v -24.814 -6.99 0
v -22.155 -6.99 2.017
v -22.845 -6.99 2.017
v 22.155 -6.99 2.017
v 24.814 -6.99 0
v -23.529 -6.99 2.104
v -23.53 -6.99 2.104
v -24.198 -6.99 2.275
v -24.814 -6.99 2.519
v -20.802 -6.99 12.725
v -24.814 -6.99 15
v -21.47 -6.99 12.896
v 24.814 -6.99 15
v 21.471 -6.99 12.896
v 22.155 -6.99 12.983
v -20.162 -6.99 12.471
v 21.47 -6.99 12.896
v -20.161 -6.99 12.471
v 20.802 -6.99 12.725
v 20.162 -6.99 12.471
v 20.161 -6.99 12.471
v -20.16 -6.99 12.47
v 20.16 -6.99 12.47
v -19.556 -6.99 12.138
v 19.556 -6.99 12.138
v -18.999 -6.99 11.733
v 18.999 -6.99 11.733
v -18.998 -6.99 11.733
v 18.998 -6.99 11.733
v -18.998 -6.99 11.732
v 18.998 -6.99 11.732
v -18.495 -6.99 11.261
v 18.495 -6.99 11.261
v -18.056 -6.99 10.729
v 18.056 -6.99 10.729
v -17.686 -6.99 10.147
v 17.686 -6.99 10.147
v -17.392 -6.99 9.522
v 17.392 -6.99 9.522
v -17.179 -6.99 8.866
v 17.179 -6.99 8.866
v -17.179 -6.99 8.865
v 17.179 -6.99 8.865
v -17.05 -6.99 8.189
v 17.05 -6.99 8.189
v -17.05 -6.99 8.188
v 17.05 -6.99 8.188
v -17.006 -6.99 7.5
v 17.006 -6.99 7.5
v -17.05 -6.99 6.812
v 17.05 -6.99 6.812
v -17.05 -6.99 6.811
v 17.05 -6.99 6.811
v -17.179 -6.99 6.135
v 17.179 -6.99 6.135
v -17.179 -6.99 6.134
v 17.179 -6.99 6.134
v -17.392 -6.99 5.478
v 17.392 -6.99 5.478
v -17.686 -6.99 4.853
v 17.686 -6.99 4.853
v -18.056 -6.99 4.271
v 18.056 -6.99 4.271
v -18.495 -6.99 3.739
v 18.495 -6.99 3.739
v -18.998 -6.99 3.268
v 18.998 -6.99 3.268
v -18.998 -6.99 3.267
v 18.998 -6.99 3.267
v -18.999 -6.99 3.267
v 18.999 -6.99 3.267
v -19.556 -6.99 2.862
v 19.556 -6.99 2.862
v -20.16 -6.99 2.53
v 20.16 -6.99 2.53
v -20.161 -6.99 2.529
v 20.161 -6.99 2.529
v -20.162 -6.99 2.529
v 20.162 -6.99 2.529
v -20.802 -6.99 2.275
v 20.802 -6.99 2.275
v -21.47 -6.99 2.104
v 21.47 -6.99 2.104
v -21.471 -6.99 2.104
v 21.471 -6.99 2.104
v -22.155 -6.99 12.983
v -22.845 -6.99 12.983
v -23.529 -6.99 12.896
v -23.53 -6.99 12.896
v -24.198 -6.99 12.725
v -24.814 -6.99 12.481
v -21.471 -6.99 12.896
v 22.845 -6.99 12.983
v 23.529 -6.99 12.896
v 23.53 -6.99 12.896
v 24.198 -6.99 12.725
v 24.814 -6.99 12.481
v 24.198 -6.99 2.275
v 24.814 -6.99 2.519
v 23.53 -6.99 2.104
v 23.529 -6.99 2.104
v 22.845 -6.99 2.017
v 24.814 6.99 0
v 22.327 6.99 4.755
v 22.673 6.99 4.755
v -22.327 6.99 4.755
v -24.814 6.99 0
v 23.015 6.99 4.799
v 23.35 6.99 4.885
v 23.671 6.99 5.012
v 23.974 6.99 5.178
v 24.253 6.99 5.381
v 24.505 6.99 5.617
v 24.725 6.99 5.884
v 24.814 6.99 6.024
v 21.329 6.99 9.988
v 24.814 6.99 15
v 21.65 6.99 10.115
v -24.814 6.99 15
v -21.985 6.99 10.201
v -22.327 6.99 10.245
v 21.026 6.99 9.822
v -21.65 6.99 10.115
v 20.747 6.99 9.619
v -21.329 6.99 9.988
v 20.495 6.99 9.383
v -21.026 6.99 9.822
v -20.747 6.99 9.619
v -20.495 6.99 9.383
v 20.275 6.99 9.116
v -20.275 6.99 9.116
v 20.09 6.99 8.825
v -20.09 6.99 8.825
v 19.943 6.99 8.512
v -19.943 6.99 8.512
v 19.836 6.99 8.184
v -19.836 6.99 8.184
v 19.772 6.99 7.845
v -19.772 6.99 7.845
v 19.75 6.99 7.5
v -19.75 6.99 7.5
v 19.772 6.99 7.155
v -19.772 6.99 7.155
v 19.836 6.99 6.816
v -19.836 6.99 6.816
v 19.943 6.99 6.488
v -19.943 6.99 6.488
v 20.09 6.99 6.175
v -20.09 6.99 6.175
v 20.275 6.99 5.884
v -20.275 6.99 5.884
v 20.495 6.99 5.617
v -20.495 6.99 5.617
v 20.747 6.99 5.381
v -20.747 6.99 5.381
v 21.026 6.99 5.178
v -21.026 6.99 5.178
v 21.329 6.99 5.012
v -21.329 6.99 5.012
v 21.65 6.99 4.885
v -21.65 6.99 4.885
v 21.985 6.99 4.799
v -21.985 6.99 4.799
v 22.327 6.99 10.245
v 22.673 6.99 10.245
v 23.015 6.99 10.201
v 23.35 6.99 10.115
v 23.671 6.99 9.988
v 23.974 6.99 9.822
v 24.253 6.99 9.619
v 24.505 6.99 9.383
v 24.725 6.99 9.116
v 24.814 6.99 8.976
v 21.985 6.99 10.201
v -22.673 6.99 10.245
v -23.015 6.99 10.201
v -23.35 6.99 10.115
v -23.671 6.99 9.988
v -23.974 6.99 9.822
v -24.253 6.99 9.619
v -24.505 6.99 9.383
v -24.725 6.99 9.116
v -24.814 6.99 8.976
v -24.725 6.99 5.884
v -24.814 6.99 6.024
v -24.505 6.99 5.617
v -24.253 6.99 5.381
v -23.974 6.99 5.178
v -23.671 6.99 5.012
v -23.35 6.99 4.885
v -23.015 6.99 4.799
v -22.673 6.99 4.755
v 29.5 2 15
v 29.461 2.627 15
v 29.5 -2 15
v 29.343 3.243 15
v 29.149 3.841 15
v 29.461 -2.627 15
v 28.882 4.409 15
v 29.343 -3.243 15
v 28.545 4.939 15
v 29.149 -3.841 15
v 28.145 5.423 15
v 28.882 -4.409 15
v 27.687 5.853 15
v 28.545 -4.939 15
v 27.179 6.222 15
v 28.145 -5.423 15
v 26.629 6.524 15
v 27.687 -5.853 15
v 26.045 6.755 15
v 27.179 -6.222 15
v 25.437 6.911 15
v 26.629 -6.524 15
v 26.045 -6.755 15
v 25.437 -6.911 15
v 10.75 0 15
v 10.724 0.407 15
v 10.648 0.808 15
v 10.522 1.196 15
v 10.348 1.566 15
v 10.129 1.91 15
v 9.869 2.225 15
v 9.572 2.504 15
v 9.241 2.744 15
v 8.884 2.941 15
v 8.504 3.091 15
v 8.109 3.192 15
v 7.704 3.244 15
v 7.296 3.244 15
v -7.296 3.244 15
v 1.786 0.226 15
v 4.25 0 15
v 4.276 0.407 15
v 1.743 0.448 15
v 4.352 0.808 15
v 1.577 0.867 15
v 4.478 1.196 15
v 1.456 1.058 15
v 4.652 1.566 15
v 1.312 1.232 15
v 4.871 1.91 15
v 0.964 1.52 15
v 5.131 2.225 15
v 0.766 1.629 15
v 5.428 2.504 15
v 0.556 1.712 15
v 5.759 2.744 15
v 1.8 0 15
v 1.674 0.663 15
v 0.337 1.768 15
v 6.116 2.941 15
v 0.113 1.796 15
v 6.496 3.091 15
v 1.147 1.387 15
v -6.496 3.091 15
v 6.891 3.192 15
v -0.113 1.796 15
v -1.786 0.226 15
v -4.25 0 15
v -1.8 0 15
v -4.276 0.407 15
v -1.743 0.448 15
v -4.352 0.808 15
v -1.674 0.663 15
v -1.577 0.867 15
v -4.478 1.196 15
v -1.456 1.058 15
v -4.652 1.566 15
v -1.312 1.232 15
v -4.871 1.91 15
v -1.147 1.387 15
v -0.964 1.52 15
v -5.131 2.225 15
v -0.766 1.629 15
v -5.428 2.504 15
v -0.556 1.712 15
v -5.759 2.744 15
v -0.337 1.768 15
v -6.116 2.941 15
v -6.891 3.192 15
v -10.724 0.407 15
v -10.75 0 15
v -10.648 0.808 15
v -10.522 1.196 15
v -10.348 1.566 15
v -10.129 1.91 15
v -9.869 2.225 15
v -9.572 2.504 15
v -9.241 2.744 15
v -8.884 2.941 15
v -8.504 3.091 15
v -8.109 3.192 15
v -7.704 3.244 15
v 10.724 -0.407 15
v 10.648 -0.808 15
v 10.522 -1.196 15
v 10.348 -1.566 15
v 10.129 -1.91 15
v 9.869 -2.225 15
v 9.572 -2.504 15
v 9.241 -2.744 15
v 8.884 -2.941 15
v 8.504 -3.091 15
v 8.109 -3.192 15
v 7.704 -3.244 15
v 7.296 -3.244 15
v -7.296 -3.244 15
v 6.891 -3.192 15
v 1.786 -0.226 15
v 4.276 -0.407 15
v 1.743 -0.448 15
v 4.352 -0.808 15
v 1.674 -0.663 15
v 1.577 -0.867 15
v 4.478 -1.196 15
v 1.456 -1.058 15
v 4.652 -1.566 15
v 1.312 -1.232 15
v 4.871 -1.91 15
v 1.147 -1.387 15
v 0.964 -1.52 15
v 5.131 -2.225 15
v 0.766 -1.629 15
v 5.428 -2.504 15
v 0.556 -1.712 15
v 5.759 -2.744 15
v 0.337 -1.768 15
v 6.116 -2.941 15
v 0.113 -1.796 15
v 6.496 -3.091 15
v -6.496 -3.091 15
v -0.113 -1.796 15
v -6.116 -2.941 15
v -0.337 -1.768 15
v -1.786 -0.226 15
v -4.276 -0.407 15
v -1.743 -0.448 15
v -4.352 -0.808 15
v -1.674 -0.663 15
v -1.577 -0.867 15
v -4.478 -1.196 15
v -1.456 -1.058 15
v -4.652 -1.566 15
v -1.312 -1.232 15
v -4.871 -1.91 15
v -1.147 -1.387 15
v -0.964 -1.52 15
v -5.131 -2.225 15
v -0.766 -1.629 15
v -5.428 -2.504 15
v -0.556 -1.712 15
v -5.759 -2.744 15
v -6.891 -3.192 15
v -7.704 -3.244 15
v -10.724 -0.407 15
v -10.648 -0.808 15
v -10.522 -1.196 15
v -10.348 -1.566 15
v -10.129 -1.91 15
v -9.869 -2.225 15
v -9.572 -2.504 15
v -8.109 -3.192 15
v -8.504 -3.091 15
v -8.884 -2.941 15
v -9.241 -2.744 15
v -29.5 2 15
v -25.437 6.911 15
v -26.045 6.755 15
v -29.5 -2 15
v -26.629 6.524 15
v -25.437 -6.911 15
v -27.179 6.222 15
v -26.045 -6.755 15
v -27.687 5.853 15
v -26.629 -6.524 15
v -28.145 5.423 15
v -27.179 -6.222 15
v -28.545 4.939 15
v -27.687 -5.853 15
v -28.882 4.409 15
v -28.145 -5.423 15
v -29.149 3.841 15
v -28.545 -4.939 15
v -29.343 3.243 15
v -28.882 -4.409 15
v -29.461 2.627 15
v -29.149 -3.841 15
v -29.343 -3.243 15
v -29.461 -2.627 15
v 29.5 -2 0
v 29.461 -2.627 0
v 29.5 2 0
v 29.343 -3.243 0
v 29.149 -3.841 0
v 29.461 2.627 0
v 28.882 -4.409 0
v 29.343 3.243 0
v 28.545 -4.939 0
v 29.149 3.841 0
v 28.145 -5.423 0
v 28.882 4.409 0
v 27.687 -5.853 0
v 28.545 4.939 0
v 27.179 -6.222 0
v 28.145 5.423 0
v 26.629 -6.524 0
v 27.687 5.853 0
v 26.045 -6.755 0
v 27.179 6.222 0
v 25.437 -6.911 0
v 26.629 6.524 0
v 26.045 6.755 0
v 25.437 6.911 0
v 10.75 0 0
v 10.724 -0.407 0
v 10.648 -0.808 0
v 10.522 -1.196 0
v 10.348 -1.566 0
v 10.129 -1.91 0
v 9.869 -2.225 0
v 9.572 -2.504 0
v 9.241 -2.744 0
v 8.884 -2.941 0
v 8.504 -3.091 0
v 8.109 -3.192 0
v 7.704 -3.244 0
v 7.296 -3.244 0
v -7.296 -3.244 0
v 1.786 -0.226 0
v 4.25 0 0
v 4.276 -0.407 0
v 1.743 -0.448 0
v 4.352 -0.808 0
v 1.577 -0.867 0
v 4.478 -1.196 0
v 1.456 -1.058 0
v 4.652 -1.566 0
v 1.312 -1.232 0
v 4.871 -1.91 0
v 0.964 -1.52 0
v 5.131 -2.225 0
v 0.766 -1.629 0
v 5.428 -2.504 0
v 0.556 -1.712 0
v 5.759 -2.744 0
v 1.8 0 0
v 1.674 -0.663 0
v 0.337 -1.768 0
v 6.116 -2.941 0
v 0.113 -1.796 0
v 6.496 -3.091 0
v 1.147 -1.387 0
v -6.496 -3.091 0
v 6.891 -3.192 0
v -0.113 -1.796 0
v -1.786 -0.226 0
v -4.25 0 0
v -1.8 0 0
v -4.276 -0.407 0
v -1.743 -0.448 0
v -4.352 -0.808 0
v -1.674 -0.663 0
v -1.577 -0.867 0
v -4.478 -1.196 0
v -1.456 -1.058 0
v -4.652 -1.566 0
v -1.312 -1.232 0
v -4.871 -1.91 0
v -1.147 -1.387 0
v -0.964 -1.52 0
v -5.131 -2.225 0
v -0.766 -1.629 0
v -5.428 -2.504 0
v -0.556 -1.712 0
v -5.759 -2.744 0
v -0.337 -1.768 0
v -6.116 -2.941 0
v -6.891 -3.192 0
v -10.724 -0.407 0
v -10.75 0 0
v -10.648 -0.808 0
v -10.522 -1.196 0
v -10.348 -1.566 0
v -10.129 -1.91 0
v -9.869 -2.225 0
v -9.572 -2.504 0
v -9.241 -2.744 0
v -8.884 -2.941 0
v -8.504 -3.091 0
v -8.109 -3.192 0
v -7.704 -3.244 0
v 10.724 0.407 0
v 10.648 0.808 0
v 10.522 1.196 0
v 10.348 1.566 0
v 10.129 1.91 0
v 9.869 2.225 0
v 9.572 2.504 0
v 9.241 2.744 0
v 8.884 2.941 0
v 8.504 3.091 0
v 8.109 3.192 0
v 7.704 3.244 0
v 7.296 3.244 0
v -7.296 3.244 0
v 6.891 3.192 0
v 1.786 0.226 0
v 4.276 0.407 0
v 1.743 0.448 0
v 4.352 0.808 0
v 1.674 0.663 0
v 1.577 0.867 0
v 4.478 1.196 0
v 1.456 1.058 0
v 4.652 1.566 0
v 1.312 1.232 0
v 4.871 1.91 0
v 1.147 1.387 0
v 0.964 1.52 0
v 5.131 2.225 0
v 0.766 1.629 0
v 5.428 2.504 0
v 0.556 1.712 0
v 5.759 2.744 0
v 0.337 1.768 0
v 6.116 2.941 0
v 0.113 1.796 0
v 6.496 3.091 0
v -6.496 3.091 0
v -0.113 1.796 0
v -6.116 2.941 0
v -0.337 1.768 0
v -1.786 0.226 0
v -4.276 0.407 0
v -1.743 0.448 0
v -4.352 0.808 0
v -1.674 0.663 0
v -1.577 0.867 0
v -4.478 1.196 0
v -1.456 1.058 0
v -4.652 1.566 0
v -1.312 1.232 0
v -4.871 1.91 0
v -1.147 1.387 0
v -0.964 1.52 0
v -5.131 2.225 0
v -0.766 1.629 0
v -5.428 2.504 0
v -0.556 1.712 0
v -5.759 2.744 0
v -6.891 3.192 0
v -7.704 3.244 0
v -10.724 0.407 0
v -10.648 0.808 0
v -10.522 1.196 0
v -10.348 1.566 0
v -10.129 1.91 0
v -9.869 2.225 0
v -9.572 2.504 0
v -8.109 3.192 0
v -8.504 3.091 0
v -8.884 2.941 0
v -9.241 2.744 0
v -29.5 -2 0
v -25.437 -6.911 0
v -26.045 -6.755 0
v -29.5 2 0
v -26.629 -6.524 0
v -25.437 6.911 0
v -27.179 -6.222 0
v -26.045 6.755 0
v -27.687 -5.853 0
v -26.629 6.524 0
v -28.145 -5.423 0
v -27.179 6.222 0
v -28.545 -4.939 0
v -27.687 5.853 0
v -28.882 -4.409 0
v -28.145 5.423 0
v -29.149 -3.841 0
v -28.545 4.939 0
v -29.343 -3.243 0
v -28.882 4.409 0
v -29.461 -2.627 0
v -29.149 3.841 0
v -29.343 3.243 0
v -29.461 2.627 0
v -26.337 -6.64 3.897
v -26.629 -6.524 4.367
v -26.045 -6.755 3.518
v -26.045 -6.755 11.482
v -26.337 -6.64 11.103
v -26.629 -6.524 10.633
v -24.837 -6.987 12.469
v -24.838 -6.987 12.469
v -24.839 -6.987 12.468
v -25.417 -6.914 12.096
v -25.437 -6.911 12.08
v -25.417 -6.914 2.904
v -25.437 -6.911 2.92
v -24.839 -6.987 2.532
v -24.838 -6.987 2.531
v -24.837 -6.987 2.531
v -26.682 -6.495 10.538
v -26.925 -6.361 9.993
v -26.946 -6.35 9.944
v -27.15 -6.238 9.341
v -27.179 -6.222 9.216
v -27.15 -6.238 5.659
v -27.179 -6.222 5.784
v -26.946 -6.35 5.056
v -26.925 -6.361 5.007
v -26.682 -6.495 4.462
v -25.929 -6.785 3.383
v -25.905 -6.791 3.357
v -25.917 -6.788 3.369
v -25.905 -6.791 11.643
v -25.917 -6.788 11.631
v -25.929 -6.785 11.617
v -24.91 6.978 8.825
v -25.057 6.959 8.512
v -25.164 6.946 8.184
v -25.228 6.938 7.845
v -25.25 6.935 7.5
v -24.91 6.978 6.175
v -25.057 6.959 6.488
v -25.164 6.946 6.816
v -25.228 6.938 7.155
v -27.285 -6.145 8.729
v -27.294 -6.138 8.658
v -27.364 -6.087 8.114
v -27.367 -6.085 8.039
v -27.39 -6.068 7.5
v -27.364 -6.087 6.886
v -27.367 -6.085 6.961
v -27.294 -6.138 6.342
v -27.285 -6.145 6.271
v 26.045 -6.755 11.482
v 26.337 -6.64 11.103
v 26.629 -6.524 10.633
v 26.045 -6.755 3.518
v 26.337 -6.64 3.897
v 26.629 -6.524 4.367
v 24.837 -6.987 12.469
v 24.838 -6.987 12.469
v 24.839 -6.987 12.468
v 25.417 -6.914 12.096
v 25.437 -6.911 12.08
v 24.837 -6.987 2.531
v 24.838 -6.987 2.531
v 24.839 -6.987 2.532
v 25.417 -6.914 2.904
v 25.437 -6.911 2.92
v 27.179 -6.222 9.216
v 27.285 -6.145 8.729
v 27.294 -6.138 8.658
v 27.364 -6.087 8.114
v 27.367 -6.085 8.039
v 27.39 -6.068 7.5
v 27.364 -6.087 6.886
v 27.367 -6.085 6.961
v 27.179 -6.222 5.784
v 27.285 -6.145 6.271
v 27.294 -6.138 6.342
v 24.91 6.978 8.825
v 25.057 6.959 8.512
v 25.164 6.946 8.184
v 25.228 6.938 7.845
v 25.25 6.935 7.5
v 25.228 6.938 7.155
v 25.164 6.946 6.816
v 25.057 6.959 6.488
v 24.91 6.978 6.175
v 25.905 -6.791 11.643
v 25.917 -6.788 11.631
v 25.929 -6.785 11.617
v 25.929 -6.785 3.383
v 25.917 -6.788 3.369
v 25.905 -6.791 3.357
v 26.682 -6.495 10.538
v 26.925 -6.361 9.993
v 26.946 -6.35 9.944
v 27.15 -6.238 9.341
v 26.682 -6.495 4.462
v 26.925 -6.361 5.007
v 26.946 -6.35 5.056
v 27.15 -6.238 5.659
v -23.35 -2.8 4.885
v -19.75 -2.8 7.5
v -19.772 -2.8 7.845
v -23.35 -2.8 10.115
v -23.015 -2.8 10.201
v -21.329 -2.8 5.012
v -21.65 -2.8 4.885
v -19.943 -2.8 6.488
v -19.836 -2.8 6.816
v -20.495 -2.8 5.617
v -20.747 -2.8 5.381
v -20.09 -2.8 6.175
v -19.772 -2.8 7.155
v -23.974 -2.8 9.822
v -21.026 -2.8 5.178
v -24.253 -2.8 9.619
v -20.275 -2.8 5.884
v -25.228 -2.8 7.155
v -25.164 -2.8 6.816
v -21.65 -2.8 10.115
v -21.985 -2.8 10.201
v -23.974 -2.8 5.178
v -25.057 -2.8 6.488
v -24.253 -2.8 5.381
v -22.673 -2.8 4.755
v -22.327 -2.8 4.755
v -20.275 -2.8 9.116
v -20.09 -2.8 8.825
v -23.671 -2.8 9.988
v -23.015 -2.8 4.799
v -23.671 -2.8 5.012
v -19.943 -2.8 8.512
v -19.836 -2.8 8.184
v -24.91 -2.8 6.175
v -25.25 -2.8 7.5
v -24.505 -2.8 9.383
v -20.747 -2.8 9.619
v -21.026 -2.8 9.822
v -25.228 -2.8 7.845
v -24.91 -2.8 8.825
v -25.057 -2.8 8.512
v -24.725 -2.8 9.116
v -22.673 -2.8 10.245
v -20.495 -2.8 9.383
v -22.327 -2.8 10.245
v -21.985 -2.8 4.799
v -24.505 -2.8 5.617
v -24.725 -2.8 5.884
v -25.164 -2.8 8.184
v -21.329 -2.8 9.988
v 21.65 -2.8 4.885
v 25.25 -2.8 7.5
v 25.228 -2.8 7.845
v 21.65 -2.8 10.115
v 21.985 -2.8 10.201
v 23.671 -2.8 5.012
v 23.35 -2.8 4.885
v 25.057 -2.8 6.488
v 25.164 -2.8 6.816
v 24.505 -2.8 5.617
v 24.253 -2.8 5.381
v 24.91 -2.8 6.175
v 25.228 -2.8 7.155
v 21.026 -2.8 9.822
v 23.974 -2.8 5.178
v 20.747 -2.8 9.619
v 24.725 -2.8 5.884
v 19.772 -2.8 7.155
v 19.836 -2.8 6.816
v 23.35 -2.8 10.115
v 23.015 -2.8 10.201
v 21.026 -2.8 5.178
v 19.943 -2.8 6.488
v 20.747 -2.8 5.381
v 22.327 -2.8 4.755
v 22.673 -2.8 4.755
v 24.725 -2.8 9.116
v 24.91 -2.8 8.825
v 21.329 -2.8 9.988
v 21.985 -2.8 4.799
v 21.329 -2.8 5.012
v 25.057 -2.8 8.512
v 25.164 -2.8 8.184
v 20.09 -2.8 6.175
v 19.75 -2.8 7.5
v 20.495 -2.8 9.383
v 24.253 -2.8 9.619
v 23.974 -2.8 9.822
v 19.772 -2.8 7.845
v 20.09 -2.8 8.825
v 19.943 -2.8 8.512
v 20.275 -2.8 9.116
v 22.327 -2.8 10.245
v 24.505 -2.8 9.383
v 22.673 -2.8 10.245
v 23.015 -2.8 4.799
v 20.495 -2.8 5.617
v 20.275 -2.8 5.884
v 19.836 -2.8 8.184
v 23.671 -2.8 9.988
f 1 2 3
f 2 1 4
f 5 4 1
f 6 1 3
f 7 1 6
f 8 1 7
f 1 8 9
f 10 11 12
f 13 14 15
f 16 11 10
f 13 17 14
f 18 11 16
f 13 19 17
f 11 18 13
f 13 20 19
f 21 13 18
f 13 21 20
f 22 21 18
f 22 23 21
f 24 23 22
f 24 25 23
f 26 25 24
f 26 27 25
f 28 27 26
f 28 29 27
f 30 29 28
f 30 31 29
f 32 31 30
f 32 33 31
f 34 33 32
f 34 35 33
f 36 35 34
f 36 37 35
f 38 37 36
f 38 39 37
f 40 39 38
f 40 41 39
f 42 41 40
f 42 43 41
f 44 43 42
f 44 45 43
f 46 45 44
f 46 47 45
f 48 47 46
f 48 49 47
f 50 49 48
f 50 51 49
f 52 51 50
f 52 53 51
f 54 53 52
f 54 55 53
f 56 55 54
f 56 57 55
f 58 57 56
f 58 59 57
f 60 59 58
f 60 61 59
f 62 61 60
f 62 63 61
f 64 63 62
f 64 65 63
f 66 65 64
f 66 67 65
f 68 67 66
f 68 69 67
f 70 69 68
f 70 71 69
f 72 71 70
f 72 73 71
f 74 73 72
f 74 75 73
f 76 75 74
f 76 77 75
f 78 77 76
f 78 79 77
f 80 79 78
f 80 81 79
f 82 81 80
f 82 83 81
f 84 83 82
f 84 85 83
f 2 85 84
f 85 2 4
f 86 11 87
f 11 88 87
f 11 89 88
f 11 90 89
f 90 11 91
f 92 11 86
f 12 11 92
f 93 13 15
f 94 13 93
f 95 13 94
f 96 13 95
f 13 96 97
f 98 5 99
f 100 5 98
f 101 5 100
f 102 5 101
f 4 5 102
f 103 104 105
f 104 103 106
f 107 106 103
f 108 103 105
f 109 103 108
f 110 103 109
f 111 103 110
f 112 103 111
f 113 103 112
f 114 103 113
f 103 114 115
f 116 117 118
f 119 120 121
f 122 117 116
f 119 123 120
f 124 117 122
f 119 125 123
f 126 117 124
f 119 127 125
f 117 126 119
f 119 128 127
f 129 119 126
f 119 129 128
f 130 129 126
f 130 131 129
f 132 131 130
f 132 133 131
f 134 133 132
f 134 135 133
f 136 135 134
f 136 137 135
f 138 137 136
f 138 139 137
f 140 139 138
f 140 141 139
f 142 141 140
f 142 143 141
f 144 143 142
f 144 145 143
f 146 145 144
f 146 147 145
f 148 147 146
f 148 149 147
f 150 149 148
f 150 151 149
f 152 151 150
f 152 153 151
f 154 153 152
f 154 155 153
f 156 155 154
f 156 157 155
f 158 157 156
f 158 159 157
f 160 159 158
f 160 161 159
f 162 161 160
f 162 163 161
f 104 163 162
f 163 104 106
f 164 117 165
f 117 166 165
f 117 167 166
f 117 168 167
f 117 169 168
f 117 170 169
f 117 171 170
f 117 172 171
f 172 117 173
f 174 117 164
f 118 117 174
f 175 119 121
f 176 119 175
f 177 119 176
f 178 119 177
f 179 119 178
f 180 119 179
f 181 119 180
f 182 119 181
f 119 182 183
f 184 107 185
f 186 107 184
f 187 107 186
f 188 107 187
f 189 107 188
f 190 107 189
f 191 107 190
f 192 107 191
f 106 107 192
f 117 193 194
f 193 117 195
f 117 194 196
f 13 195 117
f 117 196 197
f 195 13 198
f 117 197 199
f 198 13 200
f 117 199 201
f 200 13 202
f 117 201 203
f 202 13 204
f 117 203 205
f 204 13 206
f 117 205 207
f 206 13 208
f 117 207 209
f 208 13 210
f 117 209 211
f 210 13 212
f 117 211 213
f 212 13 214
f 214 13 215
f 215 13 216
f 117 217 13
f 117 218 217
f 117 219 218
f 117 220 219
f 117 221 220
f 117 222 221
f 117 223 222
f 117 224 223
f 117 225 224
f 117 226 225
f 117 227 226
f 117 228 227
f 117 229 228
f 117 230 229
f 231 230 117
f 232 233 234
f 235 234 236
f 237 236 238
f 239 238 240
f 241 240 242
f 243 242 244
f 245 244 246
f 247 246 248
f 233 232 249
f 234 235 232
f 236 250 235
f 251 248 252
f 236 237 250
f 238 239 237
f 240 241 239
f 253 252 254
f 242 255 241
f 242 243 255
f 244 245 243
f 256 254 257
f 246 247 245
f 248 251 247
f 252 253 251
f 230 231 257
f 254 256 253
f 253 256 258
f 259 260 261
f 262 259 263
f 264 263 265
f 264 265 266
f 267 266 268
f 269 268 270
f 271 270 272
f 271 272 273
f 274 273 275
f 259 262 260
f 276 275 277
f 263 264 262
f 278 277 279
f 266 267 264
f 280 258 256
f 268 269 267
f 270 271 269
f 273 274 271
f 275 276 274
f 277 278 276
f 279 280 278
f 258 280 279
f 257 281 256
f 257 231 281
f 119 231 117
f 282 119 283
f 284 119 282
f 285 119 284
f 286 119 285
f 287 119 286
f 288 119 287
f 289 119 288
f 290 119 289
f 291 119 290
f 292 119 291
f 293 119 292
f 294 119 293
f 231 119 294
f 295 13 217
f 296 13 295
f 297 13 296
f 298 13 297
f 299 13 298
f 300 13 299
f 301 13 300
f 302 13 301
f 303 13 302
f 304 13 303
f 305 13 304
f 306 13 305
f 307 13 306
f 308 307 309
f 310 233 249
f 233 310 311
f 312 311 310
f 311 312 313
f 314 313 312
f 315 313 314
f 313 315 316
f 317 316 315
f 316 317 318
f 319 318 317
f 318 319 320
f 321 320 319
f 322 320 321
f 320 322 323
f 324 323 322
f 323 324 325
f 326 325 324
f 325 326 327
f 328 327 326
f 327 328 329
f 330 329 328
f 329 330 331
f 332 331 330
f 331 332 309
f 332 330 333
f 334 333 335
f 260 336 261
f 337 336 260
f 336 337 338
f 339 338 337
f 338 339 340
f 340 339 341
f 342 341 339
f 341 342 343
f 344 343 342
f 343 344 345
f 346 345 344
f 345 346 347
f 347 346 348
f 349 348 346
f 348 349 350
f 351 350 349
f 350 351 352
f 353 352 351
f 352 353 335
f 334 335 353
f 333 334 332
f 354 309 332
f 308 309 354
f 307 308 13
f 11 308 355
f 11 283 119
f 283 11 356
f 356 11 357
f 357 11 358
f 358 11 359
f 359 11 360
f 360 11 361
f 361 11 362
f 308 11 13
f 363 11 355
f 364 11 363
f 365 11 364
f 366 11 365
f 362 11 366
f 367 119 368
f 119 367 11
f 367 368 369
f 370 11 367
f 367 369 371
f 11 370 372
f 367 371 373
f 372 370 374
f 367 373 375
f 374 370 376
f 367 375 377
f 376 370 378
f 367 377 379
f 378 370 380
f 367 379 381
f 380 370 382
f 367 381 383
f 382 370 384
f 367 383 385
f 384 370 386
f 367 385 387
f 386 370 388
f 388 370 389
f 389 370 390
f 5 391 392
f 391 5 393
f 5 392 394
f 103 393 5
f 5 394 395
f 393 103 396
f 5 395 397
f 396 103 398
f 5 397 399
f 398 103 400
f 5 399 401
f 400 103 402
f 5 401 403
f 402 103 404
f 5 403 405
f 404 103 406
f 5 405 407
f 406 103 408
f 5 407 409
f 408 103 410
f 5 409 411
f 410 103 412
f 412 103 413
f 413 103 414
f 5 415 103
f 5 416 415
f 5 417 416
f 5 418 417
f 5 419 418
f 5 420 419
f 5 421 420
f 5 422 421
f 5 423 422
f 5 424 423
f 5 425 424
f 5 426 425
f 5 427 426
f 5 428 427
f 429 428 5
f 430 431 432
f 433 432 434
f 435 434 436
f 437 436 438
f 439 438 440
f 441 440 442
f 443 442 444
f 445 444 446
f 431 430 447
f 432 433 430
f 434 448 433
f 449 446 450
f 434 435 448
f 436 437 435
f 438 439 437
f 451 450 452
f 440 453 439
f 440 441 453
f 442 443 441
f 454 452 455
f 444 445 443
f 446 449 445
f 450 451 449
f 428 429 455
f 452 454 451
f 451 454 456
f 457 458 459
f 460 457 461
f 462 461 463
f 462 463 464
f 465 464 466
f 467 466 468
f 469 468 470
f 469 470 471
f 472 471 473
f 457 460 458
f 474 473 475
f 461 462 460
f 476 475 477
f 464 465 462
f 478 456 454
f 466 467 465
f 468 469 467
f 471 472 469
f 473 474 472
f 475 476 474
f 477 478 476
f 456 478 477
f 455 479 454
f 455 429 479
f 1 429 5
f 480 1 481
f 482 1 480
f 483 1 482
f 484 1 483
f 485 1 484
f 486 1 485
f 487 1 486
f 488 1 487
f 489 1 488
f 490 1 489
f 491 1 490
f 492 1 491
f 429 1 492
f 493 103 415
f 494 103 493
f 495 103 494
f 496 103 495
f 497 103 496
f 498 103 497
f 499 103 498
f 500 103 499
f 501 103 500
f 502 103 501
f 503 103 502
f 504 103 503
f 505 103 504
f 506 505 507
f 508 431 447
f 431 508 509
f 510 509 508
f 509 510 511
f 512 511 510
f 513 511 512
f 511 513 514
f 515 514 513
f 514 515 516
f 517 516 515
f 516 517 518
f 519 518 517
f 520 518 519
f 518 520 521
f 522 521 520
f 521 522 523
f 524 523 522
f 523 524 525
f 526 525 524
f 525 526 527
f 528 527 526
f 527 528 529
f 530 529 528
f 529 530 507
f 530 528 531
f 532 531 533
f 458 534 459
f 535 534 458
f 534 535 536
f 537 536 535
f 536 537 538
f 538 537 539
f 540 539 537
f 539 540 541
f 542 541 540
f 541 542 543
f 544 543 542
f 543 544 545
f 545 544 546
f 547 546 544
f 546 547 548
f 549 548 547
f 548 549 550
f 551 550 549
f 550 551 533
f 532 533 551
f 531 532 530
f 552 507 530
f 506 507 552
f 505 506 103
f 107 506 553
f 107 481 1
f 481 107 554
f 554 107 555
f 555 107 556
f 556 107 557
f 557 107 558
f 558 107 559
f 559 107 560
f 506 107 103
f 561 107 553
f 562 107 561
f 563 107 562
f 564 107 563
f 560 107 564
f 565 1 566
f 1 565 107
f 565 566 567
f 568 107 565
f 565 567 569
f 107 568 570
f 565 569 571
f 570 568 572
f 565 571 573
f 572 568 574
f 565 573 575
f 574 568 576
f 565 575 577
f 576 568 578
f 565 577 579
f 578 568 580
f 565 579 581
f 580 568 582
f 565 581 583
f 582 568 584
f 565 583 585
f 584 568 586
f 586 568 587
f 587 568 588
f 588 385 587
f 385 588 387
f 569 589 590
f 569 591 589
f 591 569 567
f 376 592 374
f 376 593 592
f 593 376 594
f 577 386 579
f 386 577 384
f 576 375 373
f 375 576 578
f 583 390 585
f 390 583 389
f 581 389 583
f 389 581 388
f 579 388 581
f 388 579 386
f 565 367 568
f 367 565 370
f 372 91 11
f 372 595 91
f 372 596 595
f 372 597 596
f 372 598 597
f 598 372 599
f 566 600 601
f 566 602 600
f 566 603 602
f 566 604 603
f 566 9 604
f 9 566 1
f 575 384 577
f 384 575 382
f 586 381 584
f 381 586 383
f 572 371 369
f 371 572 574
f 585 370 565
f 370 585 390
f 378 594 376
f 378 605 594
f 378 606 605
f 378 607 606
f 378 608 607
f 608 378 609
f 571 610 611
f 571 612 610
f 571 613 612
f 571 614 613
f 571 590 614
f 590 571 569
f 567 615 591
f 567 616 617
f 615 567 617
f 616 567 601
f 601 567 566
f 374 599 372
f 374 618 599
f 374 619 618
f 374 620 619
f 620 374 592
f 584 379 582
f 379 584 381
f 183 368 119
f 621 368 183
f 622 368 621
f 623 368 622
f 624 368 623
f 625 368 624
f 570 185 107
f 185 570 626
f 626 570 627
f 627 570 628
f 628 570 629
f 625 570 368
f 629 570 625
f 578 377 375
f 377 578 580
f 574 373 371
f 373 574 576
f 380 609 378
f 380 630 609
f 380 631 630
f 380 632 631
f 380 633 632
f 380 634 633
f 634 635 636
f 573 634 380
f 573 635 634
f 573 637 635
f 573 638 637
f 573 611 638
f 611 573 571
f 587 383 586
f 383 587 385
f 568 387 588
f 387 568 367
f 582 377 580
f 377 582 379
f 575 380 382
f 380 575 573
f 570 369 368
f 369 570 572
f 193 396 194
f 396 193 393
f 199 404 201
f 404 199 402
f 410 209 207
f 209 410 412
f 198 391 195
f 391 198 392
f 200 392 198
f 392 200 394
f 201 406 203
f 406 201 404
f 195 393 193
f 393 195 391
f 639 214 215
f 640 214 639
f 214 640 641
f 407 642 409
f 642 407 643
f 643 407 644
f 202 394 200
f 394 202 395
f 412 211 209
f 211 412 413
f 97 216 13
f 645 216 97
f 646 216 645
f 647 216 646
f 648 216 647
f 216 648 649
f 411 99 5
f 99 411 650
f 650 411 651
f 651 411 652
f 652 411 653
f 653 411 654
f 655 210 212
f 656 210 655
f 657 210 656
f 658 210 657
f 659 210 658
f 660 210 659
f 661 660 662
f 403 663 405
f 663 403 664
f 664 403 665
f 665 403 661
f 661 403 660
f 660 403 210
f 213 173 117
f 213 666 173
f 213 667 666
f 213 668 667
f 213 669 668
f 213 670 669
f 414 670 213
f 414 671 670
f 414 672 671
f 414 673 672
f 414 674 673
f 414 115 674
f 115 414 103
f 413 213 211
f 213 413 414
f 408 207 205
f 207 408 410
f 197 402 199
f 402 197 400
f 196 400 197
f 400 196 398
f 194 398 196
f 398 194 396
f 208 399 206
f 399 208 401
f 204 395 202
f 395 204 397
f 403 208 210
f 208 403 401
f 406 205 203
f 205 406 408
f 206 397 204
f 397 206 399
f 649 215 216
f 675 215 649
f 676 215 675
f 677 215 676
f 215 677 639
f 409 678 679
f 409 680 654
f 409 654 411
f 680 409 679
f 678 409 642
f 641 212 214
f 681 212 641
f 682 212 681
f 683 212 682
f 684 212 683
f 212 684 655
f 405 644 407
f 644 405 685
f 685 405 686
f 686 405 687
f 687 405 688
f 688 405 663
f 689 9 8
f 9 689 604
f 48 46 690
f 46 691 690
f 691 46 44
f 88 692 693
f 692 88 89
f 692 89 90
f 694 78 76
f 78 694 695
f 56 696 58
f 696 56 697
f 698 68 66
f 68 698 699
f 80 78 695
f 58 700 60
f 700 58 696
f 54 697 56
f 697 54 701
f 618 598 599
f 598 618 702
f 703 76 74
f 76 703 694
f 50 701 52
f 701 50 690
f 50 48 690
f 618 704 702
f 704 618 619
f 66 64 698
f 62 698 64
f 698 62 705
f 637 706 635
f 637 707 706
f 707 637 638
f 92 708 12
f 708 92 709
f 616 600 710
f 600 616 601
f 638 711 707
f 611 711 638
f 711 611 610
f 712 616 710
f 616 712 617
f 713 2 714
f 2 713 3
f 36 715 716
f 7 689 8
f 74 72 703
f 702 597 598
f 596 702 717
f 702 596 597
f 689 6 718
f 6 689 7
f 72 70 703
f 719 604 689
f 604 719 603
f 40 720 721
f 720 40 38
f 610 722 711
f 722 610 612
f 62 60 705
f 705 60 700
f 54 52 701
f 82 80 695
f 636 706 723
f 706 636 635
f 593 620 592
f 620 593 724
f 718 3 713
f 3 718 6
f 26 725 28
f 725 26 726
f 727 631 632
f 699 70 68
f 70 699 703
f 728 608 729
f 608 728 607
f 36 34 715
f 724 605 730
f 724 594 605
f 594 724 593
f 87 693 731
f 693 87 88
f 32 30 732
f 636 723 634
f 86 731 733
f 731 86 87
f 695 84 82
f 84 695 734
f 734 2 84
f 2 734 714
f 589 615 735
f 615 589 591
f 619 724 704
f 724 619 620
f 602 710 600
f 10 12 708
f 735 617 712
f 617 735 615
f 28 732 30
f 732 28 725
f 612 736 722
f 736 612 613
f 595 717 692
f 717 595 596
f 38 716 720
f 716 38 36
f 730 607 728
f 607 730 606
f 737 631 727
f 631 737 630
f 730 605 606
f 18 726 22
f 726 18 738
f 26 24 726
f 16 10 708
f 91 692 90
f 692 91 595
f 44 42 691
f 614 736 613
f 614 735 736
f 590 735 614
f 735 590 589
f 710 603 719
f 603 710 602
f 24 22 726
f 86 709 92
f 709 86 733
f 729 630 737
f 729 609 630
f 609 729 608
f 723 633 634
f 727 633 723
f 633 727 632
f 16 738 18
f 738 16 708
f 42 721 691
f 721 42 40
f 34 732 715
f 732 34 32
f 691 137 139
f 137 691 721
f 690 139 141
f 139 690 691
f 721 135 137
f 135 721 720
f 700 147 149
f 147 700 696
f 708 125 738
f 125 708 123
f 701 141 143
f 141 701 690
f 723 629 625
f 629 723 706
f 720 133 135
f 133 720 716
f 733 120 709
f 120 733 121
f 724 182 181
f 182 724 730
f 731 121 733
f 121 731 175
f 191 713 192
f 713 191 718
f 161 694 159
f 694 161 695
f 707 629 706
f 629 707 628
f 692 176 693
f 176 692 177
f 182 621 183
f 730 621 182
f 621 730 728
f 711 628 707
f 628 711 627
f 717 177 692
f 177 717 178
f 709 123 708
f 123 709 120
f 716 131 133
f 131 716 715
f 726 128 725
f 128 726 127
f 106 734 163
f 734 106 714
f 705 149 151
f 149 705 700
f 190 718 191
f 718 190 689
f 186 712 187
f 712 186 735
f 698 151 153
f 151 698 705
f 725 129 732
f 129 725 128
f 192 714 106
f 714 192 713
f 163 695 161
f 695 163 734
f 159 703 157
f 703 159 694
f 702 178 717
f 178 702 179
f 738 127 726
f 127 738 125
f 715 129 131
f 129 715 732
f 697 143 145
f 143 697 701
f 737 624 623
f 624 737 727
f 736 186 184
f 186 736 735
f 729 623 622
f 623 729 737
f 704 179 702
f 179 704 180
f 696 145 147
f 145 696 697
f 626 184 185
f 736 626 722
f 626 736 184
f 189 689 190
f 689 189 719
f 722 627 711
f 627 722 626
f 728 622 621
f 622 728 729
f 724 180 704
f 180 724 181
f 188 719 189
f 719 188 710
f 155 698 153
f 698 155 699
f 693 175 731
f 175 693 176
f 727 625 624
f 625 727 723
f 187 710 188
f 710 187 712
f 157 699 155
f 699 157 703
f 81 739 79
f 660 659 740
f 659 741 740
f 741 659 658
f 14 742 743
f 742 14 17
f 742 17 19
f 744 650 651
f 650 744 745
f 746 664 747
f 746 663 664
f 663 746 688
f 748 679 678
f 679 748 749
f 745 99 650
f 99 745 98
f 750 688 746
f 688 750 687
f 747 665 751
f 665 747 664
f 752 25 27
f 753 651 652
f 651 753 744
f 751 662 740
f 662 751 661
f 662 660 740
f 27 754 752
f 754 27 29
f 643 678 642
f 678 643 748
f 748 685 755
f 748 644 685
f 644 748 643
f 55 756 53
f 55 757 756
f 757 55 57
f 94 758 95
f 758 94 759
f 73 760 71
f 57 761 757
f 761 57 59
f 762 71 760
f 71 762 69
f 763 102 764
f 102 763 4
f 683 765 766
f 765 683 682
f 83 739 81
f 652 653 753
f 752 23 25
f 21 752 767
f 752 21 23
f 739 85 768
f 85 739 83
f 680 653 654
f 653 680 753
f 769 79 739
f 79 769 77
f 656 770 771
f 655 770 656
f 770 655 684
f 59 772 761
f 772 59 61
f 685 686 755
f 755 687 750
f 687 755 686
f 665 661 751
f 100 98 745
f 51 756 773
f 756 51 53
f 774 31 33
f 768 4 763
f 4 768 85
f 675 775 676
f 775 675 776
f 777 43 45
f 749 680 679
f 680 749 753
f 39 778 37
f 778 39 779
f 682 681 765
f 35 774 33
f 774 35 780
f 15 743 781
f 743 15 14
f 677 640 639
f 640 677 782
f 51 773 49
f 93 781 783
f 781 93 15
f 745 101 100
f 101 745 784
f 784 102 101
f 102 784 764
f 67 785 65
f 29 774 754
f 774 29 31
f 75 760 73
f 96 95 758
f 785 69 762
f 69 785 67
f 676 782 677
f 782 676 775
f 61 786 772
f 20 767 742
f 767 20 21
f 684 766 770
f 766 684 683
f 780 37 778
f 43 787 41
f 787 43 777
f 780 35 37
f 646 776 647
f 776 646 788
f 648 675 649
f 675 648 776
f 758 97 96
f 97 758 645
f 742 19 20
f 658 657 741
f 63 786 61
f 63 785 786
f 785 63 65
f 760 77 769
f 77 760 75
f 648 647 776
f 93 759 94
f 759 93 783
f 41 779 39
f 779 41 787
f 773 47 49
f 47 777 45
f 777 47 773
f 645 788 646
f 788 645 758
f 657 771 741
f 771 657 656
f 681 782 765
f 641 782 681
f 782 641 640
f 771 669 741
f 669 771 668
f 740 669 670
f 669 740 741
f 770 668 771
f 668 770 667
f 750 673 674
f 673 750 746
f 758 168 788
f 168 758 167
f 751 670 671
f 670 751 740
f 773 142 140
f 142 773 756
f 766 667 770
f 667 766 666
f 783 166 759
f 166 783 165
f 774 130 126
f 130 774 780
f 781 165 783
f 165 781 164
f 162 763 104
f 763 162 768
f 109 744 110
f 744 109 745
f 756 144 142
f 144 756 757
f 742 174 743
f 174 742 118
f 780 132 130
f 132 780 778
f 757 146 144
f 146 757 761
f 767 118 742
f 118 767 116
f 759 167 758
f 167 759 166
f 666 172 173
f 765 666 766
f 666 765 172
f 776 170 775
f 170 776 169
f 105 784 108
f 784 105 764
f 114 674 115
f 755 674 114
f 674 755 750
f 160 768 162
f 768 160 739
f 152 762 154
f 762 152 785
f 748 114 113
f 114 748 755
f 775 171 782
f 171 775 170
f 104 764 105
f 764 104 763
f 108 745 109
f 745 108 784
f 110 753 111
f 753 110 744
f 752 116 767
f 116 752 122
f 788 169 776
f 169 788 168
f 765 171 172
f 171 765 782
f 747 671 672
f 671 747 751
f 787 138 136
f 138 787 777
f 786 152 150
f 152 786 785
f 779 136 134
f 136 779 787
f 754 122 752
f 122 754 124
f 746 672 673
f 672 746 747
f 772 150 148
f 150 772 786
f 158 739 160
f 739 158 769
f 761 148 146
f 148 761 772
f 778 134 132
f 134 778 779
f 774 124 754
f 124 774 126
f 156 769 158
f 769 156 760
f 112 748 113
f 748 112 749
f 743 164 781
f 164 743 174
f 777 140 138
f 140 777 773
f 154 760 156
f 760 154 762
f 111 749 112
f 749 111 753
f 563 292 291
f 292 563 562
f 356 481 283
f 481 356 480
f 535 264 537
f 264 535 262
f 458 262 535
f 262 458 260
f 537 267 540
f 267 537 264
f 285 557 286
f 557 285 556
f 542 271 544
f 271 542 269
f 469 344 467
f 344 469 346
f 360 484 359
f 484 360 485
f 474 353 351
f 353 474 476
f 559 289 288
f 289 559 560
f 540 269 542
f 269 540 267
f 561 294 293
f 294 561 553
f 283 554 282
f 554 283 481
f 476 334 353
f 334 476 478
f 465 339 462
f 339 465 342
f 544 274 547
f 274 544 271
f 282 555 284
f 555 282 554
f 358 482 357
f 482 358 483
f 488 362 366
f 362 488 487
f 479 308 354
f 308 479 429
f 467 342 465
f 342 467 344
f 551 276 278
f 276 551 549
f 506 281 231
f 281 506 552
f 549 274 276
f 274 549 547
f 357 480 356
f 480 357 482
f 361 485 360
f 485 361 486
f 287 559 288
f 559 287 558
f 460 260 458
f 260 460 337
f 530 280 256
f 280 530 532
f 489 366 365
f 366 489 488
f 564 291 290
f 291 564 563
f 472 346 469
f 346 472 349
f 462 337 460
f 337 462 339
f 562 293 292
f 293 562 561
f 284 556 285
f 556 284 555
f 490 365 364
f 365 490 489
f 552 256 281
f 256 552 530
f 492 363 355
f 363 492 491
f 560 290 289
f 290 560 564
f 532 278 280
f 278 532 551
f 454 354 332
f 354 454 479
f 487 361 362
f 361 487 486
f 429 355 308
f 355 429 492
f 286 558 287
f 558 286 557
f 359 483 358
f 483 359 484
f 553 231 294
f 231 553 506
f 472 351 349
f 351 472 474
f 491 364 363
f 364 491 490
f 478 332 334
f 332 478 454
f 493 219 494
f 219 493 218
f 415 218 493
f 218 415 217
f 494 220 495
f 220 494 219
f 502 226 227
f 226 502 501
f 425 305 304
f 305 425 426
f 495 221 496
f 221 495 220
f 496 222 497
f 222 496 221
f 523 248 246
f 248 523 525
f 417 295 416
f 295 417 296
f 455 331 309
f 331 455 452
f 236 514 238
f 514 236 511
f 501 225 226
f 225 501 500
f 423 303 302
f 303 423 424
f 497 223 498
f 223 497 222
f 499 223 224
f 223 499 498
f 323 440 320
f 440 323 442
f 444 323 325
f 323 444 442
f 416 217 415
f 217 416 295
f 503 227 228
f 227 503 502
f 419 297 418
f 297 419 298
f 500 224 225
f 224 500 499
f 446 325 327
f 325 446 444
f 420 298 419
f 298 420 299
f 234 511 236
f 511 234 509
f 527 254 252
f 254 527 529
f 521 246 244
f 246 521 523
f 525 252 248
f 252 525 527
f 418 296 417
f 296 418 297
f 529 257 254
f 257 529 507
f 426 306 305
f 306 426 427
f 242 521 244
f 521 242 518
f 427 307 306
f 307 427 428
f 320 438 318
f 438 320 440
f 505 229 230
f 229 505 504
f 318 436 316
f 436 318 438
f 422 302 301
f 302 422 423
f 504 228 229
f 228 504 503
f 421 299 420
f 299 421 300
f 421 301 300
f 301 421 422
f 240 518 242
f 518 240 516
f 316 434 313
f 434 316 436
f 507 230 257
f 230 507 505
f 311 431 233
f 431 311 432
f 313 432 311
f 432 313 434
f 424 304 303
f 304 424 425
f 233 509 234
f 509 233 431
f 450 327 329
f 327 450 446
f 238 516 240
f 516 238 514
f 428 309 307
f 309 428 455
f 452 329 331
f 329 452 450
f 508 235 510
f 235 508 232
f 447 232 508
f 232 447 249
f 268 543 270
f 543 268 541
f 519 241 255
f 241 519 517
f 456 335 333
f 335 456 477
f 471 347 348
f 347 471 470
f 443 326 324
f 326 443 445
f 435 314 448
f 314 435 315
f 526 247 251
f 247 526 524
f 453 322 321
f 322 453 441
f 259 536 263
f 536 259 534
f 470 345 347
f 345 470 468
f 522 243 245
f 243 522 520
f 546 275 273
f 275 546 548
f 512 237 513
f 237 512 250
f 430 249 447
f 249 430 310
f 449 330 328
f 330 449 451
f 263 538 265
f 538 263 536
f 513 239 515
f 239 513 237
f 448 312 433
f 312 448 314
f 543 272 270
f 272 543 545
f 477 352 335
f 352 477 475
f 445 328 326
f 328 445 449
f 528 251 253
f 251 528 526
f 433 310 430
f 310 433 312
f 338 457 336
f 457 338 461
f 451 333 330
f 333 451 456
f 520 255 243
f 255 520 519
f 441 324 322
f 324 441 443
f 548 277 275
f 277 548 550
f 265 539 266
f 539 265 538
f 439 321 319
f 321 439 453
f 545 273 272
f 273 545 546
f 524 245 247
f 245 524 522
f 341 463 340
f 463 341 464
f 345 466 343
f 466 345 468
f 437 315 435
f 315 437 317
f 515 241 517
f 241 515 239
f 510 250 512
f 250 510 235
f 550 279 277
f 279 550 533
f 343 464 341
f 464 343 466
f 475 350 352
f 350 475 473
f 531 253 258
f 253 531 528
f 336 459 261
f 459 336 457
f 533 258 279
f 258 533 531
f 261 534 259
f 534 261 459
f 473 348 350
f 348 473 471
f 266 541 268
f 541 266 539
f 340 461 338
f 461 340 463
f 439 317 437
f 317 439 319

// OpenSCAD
$fn = 50;


difference() {
	union() {
		hull() {
			translate(v = [-9.5000000000, 2.0000000000, 0]) {
				cylinder(h = 15, r = 5);
			}
			translate(v = [9.5000000000, 2.0000000000, 0]) {
				cylinder(h = 15, r = 5);
			}
			translate(v = [-9.5000000000, -2.0000000000, 0]) {
				cylinder(h = 15, r = 5);
			}
			translate(v = [9.5000000000, -2.0000000000, 0]) {
				cylinder(h = 15, r = 5);
			}
		}
		translate(v = [-15.0000000000, 0.0000000000, 0]) {
			hull() {
				translate(v = [-9.5000000000, 2.0000000000, 0]) {
					cylinder(h = 15, r = 5);
				}
				translate(v = [9.5000000000, 2.0000000000, 0]) {
					cylinder(h = 15, r = 5);
				}
				translate(v = [-9.5000000000, -2.0000000000, 0]) {
					cylinder(h = 15, r = 5);
				}
				translate(v = [9.5000000000, -2.0000000000, 0]) {
					cylinder(h = 15, r = 5);
				}
			}
		}
		translate(v = [15.0000000000, 0.0000000000, 0]) {
			hull() {
				translate(v = [-9.5000000000, 2.0000000000, 0]) {
					cylinder(h = 15, r = 5);
				}
				translate(v = [9.5000000000, 2.0000000000, 0]) {
					cylinder(h = 15, r = 5);
				}
				translate(v = [-9.5000000000, -2.0000000000, 0]) {
					cylinder(h = 15, r = 5);
				}
				translate(v = [9.5000000000, -2.0000000000, 0]) {
					cylinder(h = 15, r = 5);
				}
			}
		}
	}
	union() {
		translate(v = [-22.5000000000, -7.0000000000, 7.5000000000]) {
			rotate(a = [90, 0, 0]) {
				difference() {
					union() {
						#translate(v = [0, 0, -14.0000000000]) {
							cylinder(h = 14, r = 2.2500000000);
						}
						#translate(v = [0, 0, -4.2000000000]) {
							cylinder(h = 4.2000000000, r1 = 2.7500000000, r2 = 5.5000000000);
						}
						#translate(v = [0, 0, -14.0000000000]) {
							cylinder(h = 14, r = 2.7500000000);
						}
						#translate(v = [0, 0, -14.0000000000]) {
							cylinder(h = 14, r = 2.2500000000);
						}
					}
					union();
				}
			}
		}
		translate(v = [22.5000000000, -7.0000000000, 7.5000000000]) {
			rotate(a = [90, 0, 0]) {
				difference() {
					union() {
						#translate(v = [0, 0, -14.0000000000]) {
							cylinder(h = 14, r = 2.2500000000);
						}
						#translate(v = [0, 0, -4.2000000000]) {
							cylinder(h = 4.2000000000, r1 = 2.7500000000, r2 = 5.5000000000);
						}
						#translate(v = [0, 0, -14.0000000000]) {
							cylinder(h = 14, r = 2.7500000000);
						}
						#translate(v = [0, 0, -14.0000000000]) {
							cylinder(h = 14, r = 2.2500000000);
						}
					}
					union();
				}
			}
		}
		translate(v = [-7.5000000000, 0.0000000000, 0]) {
			translate(v = [0, 0, -100]) {
				cylinder(h = 200, r = 3.2500000000);
			}
		}
		translate(v = [7.5000000000, 0.0000000000, 0]) {
			translate(v = [0, 0, -100]) {
				cylinder(h = 200, r = 3.2500000000);
			}
		}
		translate(v = [-7.5000000000, 0.0000000000, 0]) {
			translate(v = [0, 0, -100]) {
				cylinder(h = 200, r = 1.8000000000);
			}
		}
		translate(v = [0, 0, -100]) {
			cylinder(h = 200, r = 1.8000000000);
		}
		translate(v = [7.5000000000, 0.0000000000, 0]) {
			translate(v = [0, 0, -100]) {
				cylinder(h = 200, r = 1.8000000000);
			}
		}
	}
}
